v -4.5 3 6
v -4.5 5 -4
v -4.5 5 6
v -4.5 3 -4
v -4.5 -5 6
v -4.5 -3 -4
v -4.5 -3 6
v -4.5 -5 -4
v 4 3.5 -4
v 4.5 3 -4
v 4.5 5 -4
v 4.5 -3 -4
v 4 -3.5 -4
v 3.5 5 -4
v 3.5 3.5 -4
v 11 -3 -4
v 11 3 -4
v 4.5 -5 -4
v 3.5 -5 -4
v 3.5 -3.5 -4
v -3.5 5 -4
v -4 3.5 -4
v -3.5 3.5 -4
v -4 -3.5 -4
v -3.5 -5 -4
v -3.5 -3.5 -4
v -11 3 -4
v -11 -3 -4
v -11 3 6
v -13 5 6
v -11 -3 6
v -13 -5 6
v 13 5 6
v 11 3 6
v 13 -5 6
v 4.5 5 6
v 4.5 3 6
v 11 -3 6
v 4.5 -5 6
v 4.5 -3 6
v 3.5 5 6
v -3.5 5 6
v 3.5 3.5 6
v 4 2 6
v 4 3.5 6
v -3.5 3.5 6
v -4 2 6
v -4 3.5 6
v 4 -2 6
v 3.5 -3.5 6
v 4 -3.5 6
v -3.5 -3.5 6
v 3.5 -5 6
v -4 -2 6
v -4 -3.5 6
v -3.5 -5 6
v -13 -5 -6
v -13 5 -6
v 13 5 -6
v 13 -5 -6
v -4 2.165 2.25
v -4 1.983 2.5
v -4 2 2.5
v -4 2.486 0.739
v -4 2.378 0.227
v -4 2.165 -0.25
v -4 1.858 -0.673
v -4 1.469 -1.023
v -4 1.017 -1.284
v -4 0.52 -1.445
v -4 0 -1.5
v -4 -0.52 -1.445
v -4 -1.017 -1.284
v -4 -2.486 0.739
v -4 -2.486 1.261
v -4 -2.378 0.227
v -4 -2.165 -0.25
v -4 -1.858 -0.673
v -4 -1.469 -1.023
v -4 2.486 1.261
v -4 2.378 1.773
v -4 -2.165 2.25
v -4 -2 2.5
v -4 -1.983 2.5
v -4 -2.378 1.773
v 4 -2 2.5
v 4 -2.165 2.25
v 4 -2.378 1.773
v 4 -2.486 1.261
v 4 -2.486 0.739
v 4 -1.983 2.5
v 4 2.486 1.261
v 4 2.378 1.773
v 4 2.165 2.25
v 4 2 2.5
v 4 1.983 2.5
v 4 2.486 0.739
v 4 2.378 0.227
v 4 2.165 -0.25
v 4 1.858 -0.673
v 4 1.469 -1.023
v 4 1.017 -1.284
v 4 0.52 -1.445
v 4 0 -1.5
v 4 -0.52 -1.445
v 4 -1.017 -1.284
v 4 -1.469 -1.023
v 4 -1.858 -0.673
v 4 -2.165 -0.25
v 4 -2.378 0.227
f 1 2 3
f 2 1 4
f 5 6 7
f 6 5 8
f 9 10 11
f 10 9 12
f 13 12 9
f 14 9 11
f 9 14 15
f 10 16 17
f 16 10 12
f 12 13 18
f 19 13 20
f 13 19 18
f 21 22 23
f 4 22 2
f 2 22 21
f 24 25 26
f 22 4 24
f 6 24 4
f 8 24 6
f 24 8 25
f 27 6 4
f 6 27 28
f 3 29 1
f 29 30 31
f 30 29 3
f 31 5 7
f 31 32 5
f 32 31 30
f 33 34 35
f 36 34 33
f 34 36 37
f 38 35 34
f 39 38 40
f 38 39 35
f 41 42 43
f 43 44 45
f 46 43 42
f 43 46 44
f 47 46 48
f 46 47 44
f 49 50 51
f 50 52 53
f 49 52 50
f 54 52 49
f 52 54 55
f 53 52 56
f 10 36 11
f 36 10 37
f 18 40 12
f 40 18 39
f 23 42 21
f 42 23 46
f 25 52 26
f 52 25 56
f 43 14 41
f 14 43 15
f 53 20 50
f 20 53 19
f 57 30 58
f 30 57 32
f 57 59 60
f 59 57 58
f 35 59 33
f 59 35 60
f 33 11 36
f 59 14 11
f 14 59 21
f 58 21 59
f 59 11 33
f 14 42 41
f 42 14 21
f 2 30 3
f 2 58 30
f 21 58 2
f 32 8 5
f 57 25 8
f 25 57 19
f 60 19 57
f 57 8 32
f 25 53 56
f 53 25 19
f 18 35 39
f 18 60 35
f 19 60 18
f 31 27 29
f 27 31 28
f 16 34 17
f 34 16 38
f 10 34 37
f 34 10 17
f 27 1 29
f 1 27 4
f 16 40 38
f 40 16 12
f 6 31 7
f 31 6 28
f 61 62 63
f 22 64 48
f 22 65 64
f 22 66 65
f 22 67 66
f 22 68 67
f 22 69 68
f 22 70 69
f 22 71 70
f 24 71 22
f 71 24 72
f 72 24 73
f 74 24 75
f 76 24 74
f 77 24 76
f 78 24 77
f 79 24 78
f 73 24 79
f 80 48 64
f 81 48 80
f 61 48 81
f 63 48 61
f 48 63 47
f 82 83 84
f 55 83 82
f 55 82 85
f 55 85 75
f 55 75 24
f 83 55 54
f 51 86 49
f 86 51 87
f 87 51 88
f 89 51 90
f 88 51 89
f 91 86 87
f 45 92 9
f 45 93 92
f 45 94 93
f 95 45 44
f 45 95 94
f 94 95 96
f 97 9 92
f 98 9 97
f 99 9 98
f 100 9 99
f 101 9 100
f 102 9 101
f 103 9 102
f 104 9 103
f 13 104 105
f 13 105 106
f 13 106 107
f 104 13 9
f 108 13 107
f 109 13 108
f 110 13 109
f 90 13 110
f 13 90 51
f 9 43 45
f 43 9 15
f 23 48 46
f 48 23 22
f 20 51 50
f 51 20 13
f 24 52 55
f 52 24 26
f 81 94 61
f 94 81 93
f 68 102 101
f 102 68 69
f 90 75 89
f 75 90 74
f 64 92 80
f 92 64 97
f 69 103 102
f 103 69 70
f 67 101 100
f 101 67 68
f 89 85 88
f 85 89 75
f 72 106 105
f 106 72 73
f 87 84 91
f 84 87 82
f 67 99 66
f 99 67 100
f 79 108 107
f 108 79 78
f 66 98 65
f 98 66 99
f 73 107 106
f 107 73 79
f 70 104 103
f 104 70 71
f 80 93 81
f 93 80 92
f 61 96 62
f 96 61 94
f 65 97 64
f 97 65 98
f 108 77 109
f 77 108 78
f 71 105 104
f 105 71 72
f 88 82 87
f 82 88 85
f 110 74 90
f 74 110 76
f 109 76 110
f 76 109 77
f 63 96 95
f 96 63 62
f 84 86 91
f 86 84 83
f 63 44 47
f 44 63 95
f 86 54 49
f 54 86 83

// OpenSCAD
$fs = 0.01;

rotate(a=[0,180,0])
{
  difference()
  {
    cube([26,10,12], center = true);
    translate([0,0,-1]) cube([22,6,10], center = true);
    difference()
    {
      translate([0,0,-1]) cube([9,12,10], center = true);
      translate([0,0,-1]) cube([7,12,10], center = true);
    }
  }

  difference()
  {
    translate([0,0,-1]) cube([8,7,10], center = true);
    translate([0,0,-1]) rotate(a=[0,90,0]) cylinder(h=9, r=2.5, center = true);
    translate([0,0,-4.5]) cube([10,4,4], center = true);
  }
}
